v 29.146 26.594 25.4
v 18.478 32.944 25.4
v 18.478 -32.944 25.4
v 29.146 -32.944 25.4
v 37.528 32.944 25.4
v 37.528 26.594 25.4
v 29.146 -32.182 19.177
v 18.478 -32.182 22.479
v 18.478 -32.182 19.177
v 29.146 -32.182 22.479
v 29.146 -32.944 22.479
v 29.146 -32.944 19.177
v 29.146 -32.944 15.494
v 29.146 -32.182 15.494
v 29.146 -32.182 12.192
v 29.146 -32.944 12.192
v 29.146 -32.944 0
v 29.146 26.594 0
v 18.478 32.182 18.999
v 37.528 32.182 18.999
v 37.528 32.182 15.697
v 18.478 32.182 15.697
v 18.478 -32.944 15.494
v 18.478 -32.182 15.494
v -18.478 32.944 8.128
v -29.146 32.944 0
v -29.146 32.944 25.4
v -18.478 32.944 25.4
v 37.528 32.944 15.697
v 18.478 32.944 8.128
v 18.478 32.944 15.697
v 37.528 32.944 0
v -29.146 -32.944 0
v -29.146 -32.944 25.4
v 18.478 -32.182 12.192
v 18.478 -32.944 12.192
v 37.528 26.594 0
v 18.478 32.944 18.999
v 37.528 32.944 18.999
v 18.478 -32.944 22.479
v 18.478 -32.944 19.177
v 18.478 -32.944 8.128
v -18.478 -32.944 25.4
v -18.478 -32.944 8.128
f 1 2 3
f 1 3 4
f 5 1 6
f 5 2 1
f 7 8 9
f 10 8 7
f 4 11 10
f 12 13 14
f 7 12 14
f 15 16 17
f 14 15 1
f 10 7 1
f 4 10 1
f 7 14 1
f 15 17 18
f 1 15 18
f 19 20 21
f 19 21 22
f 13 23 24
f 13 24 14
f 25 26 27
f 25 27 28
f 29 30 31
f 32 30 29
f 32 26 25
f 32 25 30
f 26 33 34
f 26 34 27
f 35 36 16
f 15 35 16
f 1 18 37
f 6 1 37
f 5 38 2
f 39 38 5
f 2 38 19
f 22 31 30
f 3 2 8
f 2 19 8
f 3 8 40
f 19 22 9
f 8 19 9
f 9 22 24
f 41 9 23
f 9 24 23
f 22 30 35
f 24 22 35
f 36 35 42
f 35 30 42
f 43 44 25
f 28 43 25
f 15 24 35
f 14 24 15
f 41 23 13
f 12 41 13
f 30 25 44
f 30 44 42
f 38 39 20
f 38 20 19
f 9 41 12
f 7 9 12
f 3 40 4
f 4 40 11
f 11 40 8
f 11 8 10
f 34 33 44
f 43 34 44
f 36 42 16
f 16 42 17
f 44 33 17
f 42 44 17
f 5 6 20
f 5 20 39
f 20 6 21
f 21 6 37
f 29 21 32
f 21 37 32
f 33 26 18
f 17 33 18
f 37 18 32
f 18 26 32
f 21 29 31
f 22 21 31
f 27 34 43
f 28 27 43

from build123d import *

# Parameters (mm, degrees)
F1_DEPTH = 8.128
F0_W     = 10.668
F0_H     = 65.8876
F0_W_2   = 8.382
F0_H_2   = 6.35
F2_DEPTH = 25.4
F3_W     = 10.668
F3_H     = 3.302
F4_DEPTH = 0.762
F5_W     = 19.05
F5_H     = 3.302
F6_DEPTH = 0.762


# Not quite as in the source:
# - a feature names something its author has since deleted; it is built from what else it names


with BuildPart() as f1:
    # F0 (on Top) → F1 (new body)
    with BuildSketch(Plane.XY):
        Polygon((18.4785, -32.9438), (18.4785, 32.9438), (-1.905, 32.9438), (-18.4785, 32.9438), (-18.4785, -32.9438), (-9.652, -32.9438), (9.652, -32.9438), align=None)
    extrude(amount=F1_DEPTH)

    # F0 (on Top) → F2 (join)
    with BuildSketch(Plane.XY):
        with Locations((-23.8125, 0)):
            Rectangle(F0_W, F0_H)
        with Locations((33.3375, 29.7688)):
            Rectangle(F0_W_2, F0_H_2)
        Polygon((29.1465, 26.5938), (29.1465, 32.9438), (18.4785, 32.9438), (18.4785, -32.9438), (29.1465, -32.9438), (29.1465, -20.2438), align=None)
    extrude(amount=F2_DEPTH)

    # F3 (on face) → F4 (cut)
    with BuildSketch(Plane.XZ.offset(32.9438)):
        with Locations((23.8125, 13.843)):
            Rectangle(F3_W, F3_H)
        with Locations((23.8125, 20.828)):
            Rectangle(F3_W, F3_H)
    extrude(amount=-F4_DEPTH, mode=Mode.SUBTRACT)

    # F5 (on face) → F6 (cut)
    with BuildSketch(Plane(origin=(0, 32.9438, 0), x_dir=(-1, 0, 0), z_dir=(0, 1, 0))):
        with Locations((-28.0035, 17.3482)):
            Rectangle(F5_W, F5_H)
    extrude(amount=-F6_DEPTH, mode=Mode.SUBTRACT)


solid = f1.part
